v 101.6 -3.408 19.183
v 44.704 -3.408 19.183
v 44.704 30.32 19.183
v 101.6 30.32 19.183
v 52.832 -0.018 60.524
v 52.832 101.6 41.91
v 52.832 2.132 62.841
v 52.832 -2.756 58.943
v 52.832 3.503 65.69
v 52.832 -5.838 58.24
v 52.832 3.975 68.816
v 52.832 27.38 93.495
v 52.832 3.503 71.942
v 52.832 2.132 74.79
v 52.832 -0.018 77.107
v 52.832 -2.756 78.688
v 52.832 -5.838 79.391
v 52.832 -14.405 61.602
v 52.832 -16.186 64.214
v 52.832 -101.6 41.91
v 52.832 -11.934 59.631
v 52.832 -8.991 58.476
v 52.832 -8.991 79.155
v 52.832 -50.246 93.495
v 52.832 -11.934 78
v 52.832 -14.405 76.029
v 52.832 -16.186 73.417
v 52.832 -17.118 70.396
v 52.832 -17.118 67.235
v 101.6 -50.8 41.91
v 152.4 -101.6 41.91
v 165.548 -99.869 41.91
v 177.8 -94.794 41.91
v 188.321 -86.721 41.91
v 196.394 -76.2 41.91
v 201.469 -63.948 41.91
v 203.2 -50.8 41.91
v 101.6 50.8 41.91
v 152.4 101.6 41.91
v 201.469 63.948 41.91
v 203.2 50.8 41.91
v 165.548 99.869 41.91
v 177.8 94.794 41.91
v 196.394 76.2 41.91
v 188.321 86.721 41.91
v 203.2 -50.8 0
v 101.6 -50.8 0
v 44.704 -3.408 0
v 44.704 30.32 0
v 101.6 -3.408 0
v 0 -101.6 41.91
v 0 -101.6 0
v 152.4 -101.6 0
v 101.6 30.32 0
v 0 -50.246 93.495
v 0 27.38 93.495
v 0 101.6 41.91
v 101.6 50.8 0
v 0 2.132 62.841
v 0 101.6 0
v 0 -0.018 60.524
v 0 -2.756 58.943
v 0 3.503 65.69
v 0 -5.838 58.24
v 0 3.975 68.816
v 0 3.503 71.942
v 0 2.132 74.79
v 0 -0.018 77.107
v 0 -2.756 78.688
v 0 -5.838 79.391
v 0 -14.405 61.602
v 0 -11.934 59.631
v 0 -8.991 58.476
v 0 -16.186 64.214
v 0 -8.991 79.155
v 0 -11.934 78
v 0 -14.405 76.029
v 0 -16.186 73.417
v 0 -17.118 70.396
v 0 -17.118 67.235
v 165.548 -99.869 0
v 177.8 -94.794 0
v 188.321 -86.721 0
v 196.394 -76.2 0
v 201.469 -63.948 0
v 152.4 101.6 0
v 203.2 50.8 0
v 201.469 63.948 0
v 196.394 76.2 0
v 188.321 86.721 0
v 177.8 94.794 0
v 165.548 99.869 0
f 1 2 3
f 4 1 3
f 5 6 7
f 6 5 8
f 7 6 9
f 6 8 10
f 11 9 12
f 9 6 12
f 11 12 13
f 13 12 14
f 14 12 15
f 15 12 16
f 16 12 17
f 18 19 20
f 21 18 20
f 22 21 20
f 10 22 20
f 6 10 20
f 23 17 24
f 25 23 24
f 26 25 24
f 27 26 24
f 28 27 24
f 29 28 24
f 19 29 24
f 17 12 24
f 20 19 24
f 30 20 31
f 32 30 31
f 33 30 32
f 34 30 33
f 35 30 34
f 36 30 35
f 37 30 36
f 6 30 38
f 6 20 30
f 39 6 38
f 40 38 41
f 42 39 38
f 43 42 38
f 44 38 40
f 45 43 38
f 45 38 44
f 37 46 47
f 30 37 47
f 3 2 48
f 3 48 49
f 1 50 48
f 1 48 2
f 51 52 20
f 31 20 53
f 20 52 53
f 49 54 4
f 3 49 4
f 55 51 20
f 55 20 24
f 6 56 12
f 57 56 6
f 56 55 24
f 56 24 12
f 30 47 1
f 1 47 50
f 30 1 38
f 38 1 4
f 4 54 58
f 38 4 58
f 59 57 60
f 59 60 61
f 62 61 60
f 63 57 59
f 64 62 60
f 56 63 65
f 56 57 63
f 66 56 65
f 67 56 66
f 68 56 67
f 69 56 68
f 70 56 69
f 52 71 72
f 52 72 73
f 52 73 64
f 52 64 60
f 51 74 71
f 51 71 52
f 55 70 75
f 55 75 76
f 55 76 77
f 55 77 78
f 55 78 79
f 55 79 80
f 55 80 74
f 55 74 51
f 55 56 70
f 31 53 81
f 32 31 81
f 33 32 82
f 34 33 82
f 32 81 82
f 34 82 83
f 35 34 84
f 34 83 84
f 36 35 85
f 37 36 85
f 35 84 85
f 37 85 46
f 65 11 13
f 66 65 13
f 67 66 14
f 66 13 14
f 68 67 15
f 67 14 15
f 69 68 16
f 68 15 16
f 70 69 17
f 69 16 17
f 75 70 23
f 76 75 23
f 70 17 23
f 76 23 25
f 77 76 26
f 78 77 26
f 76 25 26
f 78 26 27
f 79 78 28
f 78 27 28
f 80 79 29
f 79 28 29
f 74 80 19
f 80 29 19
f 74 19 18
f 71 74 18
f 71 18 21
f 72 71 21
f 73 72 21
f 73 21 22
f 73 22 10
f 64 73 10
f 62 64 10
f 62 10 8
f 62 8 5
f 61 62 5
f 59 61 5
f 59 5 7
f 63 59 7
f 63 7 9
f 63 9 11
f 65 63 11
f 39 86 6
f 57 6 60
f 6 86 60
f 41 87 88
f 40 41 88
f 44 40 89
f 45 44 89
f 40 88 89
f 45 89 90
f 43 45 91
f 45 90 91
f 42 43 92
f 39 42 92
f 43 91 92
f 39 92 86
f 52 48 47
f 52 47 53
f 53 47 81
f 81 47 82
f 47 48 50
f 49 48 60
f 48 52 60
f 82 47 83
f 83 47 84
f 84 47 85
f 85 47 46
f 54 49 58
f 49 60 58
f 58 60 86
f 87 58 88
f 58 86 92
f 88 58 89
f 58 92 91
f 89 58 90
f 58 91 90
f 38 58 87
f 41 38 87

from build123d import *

# Parameters (mm, degrees)
F1_DEPTH = 41.91
F3_DEPTH = 52.832
F4_R     = 10.605474
F5_DEPTH = 85.598
F6_W     = 33.727639
F6_H     = 19.182933
F7_DEPTH = 56.896


with BuildPart() as f1:
    # F0 (on Top) → F1 (new body)
    with BuildSketch(Plane.XY):
        with BuildLine():
            Line((0, 101.6), (0, -101.6))
            Line((0, -101.6), (152.4, -101.6))
            ThreePointArc((152.4, -101.6), (188.321024, -86.721024), (203.2, -50.8))
            Line((203.2, -50.8), (101.6, -50.8))
            Line((101.6, -50.8), (101.6, 50.8))
            Line((101.6, 50.8), (203.2, 50.8))
            ThreePointArc((203.2, 50.8), (188.321024, 86.721024), (152.4, 101.6))
            Line((152.4, 101.6), (0, 101.6))
        make_face()
    extrude(amount=F1_DEPTH)

    # F2 (on face) → F3 (join)
    with BuildSketch(Plane(origin=(0, 0, 0), x_dir=(0, -1, 0), z_dir=(-1, 0, 0))):
        Polygon((-27.380493, 93.494549), (-101.6, 41.91), (101.6, 41.91), (50.246455, 93.494549), align=None)
    extrude(amount=-F3_DEPTH)

    # F4 (on face) → F5 (cut)
    with BuildSketch(Plane.YZ.offset(52.832)):
        with Locations((-6.630837, 68.815641)):
            Circle(F4_R)
    extrude(amount=-F5_DEPTH, mode=Mode.SUBTRACT)

    # F6 (on face) → F7 (cut)
    with BuildSketch(Plane.YZ.offset(101.6)):
        with Locations((13.456206, 9.591466)):
            Rectangle(F6_W, F6_H)
    extrude(amount=-F7_DEPTH, mode=Mode.SUBTRACT)


solid = f1.part
